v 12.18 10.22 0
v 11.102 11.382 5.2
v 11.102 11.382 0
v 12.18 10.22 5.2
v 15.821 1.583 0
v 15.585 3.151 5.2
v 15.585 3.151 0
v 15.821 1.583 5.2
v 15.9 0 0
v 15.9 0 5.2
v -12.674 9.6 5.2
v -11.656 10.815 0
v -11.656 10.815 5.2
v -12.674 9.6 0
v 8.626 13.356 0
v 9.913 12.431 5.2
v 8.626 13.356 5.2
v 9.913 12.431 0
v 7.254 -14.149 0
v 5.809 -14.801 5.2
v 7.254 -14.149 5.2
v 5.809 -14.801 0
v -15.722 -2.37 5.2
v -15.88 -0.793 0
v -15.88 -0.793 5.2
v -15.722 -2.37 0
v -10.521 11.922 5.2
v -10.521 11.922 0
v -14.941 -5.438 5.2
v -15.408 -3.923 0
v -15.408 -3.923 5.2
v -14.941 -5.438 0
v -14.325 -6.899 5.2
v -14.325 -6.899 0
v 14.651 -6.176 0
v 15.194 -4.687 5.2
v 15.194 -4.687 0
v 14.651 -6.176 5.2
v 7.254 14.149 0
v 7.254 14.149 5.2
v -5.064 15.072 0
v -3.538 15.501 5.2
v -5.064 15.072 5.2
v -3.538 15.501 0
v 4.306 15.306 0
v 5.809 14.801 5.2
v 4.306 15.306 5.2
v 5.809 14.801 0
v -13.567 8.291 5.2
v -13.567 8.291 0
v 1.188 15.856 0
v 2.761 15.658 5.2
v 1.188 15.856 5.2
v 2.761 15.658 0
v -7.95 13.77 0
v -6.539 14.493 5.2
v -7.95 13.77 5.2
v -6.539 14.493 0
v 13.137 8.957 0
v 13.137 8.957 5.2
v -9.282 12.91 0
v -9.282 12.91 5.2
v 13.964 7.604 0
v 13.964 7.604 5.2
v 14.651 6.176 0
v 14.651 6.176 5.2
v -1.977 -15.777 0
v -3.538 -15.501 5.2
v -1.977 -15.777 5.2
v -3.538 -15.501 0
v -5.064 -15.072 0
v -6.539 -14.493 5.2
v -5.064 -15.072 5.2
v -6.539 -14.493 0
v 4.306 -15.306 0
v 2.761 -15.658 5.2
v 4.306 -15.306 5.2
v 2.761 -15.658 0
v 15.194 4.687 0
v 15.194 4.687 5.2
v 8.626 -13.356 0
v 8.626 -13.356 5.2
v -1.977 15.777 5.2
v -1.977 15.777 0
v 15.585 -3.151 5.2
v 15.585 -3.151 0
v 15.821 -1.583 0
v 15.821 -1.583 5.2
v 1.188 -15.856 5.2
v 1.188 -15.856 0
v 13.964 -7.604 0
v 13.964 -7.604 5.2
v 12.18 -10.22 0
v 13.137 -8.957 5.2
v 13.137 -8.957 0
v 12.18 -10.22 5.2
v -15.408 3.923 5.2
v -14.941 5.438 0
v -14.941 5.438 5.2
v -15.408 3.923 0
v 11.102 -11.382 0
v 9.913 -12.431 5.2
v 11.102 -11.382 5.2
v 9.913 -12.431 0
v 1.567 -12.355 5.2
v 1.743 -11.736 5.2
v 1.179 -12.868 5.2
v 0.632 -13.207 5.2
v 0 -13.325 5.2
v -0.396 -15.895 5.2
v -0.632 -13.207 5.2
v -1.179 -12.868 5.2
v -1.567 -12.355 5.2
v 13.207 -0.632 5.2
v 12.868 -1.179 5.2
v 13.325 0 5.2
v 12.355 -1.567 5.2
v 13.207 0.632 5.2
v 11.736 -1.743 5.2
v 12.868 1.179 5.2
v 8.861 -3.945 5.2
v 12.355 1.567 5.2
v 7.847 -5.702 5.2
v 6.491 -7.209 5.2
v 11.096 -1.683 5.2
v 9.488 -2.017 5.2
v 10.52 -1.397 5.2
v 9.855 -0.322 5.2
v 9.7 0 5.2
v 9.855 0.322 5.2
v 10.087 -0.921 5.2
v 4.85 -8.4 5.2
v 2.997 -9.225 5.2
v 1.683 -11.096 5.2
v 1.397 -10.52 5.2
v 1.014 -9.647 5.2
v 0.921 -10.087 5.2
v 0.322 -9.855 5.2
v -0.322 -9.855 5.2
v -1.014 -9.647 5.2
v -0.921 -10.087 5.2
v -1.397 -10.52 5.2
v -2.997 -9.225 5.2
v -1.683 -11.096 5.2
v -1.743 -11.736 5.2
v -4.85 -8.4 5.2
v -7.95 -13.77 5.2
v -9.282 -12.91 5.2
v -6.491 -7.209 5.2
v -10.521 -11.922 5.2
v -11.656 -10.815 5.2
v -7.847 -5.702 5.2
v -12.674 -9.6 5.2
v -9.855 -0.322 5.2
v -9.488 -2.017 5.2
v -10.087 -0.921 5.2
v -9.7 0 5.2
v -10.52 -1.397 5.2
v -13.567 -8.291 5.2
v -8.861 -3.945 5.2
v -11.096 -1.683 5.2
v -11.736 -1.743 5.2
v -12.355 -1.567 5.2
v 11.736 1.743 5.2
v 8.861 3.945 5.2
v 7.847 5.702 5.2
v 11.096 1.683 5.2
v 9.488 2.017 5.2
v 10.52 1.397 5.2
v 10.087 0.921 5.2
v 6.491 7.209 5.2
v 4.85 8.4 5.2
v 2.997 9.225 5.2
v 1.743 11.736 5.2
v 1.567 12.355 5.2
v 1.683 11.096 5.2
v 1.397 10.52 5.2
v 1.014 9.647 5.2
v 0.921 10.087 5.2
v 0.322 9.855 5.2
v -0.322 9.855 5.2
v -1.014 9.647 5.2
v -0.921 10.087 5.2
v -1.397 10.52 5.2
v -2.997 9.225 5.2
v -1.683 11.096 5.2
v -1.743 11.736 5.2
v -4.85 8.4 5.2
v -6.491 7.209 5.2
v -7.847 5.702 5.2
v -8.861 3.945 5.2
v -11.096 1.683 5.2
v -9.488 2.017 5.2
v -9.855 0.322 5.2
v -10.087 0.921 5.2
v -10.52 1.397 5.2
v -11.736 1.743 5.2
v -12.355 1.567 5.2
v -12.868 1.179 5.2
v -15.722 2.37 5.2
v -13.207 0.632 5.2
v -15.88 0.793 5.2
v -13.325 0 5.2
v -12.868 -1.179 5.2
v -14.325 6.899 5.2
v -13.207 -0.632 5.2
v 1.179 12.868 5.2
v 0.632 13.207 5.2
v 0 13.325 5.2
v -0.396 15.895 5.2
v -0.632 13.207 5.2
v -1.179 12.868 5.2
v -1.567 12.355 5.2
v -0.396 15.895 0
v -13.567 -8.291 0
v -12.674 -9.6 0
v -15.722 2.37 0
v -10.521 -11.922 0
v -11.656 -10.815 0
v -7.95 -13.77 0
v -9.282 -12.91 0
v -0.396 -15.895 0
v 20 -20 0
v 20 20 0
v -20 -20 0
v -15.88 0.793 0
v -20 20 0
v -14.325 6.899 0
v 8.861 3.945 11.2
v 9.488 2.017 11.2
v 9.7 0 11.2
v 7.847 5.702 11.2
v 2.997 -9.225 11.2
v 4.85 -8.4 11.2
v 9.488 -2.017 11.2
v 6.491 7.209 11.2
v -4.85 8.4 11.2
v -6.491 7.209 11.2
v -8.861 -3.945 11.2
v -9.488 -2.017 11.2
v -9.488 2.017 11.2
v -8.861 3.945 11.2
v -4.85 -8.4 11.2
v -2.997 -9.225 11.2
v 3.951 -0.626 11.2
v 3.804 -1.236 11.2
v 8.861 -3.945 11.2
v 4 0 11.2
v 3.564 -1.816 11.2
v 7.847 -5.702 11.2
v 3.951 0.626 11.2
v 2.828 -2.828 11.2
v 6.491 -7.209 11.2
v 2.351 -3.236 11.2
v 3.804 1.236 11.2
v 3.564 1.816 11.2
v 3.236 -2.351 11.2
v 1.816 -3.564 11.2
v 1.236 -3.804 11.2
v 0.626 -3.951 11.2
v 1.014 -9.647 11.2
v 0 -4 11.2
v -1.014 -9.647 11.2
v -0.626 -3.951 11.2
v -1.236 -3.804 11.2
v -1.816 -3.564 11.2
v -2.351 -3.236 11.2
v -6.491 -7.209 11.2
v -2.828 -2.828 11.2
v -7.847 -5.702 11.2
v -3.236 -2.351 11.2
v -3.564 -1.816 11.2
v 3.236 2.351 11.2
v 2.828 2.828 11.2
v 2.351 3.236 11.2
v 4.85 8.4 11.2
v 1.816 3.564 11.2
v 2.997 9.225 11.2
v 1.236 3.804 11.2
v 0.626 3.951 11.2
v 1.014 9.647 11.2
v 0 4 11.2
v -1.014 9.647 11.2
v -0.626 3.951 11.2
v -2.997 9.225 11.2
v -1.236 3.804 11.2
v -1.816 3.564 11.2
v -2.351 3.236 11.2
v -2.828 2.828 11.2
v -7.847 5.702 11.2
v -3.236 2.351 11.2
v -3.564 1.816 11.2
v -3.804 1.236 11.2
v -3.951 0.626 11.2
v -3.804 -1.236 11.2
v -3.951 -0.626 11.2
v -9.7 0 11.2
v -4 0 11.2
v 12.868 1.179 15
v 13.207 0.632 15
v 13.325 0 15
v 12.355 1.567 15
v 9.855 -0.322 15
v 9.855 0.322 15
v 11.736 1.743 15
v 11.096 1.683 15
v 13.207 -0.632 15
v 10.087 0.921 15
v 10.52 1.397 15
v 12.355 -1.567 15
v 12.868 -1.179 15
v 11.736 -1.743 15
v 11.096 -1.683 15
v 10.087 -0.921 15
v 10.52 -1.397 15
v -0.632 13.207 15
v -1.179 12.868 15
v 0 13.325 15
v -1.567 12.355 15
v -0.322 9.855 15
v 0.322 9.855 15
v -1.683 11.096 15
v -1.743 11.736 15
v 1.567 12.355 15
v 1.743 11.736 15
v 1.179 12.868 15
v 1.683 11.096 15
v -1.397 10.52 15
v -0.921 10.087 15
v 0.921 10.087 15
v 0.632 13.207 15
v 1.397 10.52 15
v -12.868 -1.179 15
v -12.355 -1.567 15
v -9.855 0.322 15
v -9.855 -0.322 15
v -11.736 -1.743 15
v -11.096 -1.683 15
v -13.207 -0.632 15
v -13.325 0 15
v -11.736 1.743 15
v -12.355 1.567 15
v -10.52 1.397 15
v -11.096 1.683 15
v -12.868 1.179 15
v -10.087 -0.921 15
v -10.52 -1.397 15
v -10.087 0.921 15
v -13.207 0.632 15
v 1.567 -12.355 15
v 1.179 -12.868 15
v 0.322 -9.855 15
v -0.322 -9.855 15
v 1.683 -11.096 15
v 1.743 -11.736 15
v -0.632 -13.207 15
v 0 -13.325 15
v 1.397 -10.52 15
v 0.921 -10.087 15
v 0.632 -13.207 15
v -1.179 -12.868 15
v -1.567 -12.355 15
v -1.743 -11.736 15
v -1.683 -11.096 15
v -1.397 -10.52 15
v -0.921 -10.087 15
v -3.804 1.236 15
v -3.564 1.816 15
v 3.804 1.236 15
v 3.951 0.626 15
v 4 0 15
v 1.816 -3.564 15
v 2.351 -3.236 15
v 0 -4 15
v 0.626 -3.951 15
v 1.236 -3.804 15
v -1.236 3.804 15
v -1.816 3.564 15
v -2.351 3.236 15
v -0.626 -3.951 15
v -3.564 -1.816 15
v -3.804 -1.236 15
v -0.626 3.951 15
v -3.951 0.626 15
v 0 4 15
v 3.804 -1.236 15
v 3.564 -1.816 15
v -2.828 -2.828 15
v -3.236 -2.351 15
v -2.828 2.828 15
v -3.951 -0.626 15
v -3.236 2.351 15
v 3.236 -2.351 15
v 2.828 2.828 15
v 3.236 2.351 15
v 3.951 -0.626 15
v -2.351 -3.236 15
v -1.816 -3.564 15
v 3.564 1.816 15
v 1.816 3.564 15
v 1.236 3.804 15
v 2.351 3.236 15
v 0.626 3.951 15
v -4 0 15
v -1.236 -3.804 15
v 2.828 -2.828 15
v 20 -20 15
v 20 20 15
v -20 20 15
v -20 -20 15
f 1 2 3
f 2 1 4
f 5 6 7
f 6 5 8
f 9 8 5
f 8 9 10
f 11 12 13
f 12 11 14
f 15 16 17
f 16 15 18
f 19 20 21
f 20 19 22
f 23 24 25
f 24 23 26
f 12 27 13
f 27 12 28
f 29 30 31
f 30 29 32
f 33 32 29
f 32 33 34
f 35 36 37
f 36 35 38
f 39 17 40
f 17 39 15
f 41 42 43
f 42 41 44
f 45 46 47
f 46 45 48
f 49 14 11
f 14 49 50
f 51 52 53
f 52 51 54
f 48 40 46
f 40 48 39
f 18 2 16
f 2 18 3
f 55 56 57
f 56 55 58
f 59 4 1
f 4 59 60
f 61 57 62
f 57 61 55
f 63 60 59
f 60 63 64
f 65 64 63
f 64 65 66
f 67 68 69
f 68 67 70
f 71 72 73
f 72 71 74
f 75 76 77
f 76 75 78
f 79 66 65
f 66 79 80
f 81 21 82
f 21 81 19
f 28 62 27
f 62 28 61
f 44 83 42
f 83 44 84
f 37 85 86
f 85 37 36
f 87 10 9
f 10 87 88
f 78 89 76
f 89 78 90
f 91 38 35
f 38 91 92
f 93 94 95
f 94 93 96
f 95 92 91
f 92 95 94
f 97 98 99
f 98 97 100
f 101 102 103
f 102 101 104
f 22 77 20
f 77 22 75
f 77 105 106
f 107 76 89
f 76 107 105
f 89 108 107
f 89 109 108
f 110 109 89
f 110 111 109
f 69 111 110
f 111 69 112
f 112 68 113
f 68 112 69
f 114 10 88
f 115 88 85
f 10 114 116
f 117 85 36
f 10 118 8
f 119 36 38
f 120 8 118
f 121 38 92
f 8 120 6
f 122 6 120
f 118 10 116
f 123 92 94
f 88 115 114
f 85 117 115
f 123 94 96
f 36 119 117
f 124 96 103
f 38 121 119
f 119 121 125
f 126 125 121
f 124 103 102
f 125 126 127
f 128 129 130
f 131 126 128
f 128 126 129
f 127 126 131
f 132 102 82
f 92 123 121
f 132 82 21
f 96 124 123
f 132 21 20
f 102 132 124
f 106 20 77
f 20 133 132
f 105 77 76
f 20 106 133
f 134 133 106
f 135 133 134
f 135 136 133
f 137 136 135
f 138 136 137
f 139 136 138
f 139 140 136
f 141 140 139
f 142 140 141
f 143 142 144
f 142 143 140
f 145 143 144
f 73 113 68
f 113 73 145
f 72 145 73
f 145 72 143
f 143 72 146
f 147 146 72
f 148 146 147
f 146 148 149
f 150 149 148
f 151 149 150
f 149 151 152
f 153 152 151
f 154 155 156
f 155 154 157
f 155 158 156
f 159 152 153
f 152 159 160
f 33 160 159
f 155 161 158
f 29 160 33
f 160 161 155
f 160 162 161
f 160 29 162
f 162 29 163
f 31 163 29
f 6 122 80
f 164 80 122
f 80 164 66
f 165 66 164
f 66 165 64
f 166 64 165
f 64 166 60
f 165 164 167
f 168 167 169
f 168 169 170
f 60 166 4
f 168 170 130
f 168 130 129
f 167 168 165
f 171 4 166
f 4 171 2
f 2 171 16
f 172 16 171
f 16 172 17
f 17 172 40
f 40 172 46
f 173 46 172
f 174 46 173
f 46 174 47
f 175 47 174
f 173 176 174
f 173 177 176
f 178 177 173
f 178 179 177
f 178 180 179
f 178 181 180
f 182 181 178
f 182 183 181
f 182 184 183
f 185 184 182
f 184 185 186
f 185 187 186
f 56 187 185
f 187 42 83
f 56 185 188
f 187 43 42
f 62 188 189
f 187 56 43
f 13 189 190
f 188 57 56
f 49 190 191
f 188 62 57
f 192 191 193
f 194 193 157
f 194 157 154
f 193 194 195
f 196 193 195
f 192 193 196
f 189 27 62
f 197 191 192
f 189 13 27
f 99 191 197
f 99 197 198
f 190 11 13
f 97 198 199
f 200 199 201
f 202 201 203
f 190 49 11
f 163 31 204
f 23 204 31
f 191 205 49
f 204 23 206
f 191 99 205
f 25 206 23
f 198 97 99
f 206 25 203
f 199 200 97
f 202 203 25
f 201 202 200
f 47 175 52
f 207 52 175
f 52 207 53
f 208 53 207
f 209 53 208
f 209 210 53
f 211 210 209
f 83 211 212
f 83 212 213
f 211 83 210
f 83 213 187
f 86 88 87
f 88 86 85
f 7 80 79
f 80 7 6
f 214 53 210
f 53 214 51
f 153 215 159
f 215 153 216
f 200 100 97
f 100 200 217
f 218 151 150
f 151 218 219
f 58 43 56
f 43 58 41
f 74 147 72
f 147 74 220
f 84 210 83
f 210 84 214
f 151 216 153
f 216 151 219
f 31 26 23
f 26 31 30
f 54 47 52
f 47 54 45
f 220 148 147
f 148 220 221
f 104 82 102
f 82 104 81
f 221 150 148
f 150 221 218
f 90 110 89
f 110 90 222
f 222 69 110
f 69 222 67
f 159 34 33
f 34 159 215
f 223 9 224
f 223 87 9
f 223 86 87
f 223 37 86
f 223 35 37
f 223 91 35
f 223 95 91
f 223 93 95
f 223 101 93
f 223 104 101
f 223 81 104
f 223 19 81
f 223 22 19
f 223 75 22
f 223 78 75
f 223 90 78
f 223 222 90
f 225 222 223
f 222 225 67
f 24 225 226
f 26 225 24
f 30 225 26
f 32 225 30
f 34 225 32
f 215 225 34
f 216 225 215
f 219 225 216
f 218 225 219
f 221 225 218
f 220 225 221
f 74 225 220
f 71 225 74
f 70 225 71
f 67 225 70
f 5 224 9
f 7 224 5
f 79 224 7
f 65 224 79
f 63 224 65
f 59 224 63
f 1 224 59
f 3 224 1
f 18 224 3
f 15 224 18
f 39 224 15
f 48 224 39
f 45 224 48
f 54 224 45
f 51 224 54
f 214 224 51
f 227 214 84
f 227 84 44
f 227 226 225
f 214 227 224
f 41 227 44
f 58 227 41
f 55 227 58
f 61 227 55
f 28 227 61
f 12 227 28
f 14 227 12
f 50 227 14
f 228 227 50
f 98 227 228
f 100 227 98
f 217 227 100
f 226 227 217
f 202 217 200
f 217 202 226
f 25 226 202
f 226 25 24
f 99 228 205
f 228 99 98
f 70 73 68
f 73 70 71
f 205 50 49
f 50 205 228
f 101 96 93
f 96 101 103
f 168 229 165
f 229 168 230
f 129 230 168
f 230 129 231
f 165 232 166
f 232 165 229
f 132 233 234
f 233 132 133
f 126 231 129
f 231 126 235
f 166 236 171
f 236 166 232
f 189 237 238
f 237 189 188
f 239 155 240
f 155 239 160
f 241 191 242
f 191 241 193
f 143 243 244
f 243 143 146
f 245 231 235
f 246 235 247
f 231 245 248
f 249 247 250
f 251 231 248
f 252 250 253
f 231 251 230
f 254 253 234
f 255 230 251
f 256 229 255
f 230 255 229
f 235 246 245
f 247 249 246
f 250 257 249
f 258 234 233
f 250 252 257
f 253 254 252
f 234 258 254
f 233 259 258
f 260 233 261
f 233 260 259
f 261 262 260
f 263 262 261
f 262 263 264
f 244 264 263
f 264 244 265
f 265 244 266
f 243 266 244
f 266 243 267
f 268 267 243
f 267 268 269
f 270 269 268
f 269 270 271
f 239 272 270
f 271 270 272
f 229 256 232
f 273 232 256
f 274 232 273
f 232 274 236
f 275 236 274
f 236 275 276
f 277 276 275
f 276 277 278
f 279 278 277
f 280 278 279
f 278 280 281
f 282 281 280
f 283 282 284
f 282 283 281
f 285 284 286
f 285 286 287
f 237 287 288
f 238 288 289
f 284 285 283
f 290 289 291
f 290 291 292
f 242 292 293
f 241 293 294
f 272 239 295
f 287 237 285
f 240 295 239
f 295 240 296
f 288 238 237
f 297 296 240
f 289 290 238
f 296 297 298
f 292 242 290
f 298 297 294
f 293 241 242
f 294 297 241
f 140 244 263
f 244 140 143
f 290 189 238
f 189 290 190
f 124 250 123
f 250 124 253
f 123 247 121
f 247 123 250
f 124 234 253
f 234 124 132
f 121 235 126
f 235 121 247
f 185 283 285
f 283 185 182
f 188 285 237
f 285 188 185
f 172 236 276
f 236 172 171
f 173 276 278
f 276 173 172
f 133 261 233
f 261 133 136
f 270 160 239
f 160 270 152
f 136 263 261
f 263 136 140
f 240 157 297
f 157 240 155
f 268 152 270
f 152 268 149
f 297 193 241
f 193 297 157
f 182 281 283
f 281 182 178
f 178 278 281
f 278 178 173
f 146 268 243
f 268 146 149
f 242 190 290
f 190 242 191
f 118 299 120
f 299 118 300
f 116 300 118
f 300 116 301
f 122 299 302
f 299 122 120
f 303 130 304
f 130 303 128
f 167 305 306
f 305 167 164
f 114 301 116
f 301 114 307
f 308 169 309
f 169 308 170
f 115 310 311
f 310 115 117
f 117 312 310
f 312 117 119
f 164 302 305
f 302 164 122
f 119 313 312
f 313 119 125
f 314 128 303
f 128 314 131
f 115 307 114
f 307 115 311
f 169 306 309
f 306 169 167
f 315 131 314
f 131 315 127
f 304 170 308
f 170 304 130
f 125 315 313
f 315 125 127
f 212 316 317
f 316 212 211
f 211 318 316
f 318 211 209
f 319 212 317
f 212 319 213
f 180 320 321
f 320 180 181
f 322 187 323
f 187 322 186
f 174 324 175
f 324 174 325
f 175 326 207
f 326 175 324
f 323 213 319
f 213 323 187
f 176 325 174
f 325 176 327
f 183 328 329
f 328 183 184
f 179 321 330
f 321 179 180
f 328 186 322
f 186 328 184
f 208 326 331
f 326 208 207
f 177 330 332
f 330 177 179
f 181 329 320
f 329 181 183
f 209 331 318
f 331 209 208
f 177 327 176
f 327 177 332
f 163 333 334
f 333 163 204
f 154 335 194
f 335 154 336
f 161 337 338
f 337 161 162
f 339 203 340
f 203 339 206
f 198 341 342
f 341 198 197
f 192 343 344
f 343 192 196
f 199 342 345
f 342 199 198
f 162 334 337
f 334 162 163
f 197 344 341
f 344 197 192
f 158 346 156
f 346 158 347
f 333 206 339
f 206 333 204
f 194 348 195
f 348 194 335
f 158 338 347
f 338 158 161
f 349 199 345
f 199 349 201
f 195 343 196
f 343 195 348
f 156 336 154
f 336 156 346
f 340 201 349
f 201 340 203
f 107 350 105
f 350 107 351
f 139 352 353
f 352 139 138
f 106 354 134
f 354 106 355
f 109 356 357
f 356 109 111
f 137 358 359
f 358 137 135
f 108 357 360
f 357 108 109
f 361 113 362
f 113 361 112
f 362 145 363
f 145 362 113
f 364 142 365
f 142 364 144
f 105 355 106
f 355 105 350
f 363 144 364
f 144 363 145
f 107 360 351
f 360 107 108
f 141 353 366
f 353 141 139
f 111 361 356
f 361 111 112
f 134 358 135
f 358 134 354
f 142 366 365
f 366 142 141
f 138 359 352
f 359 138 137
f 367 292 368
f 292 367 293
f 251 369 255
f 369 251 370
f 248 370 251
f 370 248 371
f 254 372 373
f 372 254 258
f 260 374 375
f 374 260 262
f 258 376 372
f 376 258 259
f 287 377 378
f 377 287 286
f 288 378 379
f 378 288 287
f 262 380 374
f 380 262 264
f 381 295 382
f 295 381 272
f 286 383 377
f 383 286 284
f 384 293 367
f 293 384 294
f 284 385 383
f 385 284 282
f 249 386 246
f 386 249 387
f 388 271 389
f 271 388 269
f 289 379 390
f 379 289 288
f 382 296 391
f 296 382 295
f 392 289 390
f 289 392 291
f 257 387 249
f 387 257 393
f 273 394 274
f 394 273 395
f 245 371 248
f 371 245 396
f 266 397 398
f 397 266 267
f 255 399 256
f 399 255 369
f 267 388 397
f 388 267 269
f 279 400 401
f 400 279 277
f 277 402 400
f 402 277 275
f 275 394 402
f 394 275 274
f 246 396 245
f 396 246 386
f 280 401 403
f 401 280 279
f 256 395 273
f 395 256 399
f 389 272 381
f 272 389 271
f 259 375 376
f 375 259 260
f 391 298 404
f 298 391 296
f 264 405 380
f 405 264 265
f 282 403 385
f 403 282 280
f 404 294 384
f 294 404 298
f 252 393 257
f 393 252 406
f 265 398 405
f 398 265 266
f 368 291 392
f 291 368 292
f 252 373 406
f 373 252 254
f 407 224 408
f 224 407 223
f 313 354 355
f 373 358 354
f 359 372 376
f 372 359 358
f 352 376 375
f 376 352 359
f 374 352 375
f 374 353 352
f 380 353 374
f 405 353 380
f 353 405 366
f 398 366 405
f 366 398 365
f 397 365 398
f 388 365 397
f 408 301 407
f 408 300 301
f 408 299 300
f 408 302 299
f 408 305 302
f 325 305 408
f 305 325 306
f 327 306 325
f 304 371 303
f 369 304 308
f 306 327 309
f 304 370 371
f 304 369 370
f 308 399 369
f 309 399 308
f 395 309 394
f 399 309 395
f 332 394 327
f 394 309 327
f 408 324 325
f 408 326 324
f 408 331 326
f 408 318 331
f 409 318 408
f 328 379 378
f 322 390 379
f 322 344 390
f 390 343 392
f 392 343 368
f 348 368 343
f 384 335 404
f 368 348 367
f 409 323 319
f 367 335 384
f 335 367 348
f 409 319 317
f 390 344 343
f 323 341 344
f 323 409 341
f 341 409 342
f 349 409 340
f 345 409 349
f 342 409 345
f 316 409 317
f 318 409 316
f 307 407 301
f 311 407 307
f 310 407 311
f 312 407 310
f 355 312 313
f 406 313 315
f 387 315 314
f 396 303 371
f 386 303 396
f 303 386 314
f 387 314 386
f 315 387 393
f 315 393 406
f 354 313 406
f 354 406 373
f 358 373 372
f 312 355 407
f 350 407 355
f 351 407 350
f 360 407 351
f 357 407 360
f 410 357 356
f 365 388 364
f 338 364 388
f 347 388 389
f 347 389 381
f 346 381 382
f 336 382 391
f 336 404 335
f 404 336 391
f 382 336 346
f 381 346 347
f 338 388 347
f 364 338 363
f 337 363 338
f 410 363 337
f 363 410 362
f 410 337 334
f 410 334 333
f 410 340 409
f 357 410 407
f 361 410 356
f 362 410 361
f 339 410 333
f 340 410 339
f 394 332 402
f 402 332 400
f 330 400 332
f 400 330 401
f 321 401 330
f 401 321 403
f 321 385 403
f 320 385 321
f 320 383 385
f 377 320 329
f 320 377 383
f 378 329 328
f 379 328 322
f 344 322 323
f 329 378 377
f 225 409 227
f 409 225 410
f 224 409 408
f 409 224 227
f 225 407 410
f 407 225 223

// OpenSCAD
// file: bearingMount.scad
top_r = 19.4 / 2;
top_h = 6;
base_r = 31.4 / 2 + 0.2;
base_h = 5.2;
hole_r = 3.5 / 2;
hole_mount_r = 23.15 / 2;
bore_r = 8 / 2;
hole_h = 50;

bearingMount();

module bearingMount(){
	difference(){
		union(){
			cylinder(r=base_r, h=base_h,$fn=base_r*4);
			translate([0,0,base_h])cylinder(r=top_r,h=top_h);
		}
		bearingMountHoles();
	}
}

module bearingMountHoles(){
	translate([0,0,-10]){
		for(i=[0:90:360]){
			rotate([0,0,i]){
				translate([hole_mount_r,0,0])cylinder(r=hole_r,h=hole_h, $fn=hole_r * 10);
			}
		}
		cylinder(r=bore_r, h=hole_h, $fn=bore_r * 10);
	}
}
// main file
use <bearingMount.scad>;

mount_h = 15;
mount_x = 40;
mount_y = 40;

difference(){
	translate([mount_x * -0.5, mount_y * -0.5, 0 ])cube([mount_x, mount_y, mount_h]);
	bearingMount();
	bearingMountHoles();
}
